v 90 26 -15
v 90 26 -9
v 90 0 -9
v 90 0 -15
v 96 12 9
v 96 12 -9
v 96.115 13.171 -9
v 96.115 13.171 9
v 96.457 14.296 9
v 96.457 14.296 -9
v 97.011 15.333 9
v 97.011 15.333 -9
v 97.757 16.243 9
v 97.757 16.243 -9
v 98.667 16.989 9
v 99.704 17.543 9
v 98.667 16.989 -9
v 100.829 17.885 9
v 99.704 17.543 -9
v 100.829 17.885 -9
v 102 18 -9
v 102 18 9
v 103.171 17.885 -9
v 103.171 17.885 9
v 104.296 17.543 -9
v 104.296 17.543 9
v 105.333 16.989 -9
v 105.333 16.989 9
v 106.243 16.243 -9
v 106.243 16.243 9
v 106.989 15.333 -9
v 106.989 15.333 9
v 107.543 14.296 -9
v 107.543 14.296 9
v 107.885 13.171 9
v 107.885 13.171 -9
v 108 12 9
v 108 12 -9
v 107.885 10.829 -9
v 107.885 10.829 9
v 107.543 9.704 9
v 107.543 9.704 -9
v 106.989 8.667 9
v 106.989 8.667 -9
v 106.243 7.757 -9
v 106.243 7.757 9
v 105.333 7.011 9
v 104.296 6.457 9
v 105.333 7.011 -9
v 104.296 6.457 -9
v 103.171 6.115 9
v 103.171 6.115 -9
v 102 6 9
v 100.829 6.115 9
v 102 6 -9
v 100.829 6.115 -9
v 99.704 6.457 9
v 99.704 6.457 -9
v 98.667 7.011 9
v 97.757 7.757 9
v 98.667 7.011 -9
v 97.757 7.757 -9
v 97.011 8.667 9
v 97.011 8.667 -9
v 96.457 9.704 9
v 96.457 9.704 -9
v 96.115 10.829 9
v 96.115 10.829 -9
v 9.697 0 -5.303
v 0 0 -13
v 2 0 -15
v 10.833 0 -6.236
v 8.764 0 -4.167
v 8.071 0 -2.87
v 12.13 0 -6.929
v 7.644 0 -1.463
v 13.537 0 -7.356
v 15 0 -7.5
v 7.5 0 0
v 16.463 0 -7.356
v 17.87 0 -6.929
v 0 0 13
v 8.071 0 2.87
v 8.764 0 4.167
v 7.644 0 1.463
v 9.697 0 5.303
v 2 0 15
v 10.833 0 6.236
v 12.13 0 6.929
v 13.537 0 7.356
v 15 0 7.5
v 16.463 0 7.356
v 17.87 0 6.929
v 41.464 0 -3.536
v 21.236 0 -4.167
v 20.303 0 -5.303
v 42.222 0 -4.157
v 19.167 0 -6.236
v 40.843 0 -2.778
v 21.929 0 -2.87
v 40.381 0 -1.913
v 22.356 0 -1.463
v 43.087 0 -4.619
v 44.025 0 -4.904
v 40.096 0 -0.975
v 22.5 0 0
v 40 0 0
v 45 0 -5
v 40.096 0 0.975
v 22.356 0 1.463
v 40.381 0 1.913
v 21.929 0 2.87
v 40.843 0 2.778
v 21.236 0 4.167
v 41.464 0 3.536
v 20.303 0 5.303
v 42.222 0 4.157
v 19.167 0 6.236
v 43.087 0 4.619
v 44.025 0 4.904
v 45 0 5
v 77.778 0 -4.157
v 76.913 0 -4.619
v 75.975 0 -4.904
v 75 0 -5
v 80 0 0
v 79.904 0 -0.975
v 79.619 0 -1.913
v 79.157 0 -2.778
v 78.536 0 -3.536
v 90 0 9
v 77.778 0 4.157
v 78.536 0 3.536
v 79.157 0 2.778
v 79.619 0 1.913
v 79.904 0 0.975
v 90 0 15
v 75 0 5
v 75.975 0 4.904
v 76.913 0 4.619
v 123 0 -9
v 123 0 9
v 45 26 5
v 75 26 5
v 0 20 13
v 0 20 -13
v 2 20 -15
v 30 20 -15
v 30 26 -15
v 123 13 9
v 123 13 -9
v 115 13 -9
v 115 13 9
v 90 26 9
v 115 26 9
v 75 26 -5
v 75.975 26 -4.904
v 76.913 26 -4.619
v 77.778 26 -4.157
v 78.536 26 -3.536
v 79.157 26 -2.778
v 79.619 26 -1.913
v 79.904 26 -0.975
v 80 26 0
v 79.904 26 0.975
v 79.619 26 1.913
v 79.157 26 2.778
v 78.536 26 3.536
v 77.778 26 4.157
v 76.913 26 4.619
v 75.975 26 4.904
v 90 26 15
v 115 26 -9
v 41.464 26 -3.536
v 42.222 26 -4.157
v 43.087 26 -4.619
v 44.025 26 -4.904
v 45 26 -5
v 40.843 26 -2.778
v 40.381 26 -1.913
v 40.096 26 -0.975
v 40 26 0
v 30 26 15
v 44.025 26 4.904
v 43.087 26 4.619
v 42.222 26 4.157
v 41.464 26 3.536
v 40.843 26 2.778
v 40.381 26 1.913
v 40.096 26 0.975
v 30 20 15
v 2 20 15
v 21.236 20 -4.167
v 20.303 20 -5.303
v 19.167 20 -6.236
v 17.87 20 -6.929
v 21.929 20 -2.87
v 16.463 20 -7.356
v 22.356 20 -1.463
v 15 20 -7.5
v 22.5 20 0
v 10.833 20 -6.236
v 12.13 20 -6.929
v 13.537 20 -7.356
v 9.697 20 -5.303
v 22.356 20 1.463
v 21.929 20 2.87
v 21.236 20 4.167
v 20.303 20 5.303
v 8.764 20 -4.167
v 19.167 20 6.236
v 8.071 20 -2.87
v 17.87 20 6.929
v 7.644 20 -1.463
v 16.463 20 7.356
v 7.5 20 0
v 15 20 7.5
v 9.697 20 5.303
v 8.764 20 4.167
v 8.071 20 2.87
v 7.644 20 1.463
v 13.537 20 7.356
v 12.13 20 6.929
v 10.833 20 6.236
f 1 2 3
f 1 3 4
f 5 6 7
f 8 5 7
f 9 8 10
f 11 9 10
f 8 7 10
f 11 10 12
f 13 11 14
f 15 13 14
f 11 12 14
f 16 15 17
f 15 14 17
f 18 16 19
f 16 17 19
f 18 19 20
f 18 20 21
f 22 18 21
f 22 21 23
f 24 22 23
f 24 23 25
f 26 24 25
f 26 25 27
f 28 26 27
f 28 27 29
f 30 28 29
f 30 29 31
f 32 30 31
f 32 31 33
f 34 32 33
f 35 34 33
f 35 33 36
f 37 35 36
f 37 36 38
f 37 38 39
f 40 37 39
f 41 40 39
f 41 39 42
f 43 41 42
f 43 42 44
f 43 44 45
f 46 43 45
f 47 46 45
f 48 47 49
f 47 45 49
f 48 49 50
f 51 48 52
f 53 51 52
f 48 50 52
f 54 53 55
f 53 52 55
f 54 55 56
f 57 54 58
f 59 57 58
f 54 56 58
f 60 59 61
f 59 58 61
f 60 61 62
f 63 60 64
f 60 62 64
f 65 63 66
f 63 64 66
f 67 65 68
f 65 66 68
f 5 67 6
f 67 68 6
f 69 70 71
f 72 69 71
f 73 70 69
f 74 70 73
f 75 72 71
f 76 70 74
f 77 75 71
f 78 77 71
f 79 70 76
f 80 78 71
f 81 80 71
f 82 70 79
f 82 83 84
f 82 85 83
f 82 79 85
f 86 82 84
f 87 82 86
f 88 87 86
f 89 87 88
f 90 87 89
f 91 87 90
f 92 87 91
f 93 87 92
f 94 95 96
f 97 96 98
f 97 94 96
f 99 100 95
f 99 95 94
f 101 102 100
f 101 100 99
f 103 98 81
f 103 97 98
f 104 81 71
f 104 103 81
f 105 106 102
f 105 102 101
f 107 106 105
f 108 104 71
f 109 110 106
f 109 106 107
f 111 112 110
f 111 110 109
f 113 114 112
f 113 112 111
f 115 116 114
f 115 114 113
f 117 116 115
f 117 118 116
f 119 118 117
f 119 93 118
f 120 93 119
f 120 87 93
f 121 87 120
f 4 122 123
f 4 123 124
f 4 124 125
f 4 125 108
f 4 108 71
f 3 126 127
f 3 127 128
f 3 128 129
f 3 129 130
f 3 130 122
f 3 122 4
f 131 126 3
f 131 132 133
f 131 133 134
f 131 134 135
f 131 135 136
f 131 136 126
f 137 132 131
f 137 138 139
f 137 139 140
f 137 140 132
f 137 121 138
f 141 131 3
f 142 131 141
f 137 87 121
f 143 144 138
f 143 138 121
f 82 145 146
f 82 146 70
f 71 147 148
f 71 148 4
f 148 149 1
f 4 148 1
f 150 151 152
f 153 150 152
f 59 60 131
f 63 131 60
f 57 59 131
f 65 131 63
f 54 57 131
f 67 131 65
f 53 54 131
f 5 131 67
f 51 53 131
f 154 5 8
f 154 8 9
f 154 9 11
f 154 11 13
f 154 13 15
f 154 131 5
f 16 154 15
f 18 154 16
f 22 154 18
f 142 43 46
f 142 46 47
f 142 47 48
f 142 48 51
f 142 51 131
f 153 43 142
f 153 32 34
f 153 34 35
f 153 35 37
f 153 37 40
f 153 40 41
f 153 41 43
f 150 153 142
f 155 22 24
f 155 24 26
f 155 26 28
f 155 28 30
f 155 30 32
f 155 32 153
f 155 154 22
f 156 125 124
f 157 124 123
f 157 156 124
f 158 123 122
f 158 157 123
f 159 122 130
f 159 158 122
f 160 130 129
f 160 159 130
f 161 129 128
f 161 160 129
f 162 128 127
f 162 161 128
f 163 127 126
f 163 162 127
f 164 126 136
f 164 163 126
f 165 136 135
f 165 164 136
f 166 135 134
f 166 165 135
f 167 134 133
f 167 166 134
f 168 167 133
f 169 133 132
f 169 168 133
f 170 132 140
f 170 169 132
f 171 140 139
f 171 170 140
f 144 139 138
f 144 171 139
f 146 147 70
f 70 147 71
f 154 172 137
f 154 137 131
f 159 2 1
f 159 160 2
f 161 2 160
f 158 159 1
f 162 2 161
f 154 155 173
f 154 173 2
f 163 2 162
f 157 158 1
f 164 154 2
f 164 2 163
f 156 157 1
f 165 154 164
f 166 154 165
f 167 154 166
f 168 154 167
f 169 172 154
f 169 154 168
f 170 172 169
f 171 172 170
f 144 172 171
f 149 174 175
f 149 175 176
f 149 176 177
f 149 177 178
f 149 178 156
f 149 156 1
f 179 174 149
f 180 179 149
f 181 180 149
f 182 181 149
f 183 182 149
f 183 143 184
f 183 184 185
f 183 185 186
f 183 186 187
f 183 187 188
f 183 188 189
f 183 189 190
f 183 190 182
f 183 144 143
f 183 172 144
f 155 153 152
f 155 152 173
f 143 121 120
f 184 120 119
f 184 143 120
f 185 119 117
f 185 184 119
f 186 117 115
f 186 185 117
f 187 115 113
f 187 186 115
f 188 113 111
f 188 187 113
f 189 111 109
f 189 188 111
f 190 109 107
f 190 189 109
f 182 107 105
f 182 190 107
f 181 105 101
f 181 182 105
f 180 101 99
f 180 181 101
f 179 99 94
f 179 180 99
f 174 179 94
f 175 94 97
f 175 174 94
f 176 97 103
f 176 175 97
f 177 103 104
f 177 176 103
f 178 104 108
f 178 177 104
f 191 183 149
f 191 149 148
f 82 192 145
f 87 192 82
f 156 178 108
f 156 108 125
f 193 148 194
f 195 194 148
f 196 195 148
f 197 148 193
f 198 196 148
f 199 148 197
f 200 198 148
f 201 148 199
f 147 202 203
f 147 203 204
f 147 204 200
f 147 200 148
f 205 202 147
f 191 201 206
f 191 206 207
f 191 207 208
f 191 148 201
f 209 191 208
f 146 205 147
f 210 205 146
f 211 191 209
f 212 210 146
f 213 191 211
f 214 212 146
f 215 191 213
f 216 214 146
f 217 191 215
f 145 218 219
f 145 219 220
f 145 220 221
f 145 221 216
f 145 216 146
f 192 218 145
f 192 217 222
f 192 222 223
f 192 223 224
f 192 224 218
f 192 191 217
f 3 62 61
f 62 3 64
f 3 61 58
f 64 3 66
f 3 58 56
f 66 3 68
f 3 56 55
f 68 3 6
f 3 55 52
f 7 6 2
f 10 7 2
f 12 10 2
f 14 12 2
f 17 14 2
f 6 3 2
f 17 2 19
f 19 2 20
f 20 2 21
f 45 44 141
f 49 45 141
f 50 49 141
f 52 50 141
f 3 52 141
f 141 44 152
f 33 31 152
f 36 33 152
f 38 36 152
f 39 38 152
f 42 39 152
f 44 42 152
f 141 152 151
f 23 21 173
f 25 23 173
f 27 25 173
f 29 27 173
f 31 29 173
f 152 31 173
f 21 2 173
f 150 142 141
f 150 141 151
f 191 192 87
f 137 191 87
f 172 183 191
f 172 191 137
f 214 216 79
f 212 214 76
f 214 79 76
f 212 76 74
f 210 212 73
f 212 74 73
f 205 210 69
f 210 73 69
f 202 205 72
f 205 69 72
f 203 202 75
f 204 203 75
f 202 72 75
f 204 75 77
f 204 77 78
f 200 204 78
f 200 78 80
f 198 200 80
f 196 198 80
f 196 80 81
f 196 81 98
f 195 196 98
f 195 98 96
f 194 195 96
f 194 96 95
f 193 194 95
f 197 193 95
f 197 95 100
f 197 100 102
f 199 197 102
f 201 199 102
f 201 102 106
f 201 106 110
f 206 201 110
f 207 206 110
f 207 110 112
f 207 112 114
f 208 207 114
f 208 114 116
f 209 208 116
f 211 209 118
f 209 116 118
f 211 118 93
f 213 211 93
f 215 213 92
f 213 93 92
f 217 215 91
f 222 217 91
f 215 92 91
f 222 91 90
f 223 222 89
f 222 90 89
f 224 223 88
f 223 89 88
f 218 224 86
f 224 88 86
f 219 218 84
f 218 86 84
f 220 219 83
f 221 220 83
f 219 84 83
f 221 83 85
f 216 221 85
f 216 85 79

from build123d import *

# Parameters (mm, degrees)
ESTRUSIONE_ESTRUSIONE1_DEPTH = 15
SCHIZZO3_W                   = 33
SCHIZZO3_H                   = 6
TAGLIO_ESTRUSIONE1_DEPTH     = 127.609636284
TAGLIO_ESTRUSIONE2_DEPTH     = 127.609636284
FORO_15_0_15_2_D             = 15
FORO_12_0_12_1_D             = 12
SMUSSO1_SIZE                 = 2


with BuildPart() as part:
    # Schizzo2 → Estrusione-Estrusione1 (new, symmetric)
    with BuildSketch(Plane.XY):
        Polygon((0, 0), (123, 0), (123, 13), (115, 13), (115, 26), (30, 26), (30, 20), (0, 20), align=None)
    extrude(amount=ESTRUSIONE_ESTRUSIONE1_DEPTH, both=True)

    # Schizzo3 → Taglio-Estrusione1 (cut, through all)
    with BuildSketch(Plane(origin=(0, 26, 0), x_dir=(1, 0, 0), z_dir=(0, 1, 0))):
        with Locations((106.5, -12)):
            Rectangle(SCHIZZO3_W, SCHIZZO3_H)
        with Locations((106.5, 12)):
            Rectangle(SCHIZZO3_W, SCHIZZO3_H)
    extrude(amount=-TAGLIO_ESTRUSIONE1_DEPTH, mode=Mode.SUBTRACT)

    # Schizzo4 → Taglio-Estrusione2 (cut, through all)
    with BuildSketch(Plane(origin=(0, 26, 0), x_dir=(1, 0, 0), z_dir=(0, 1, 0))):
        with BuildLine():
            Line((45, 5), (75, 5))
            ThreePointArc((75, 5), (80, 0), (75, -5))
            Line((75, -5), (45, -5))
            ThreePointArc((45, -5), (40, 0), (45, 5))
        make_face()
    extrude(amount=-TAGLIO_ESTRUSIONE2_DEPTH, mode=Mode.SUBTRACT)

    # Foro Ø15.0 (15)-2 (through all)
    with Locations(Plane(origin=(0, 20, 0), x_dir=(1, 0, 0), z_dir=(0, 1, 0))):
        with Locations((15, 0)):
            Hole(FORO_15_0_15_2_D / 2)

    # Foro Ø12.0 (12)-1 (through all)
    with Locations(Plane.XY.offset(9)):
        with Locations((102, 12)):
            Hole(FORO_12_0_12_1_D / 2)

    # Smusso1
    smusso1_edges = [part.edges().sort_by_distance(p)[0] for p in [
        (0, 10, -15),
        (0, 10, 15),
    ]]
    chamfer(smusso1_edges, length=SMUSSO1_SIZE)


solid = part.part
